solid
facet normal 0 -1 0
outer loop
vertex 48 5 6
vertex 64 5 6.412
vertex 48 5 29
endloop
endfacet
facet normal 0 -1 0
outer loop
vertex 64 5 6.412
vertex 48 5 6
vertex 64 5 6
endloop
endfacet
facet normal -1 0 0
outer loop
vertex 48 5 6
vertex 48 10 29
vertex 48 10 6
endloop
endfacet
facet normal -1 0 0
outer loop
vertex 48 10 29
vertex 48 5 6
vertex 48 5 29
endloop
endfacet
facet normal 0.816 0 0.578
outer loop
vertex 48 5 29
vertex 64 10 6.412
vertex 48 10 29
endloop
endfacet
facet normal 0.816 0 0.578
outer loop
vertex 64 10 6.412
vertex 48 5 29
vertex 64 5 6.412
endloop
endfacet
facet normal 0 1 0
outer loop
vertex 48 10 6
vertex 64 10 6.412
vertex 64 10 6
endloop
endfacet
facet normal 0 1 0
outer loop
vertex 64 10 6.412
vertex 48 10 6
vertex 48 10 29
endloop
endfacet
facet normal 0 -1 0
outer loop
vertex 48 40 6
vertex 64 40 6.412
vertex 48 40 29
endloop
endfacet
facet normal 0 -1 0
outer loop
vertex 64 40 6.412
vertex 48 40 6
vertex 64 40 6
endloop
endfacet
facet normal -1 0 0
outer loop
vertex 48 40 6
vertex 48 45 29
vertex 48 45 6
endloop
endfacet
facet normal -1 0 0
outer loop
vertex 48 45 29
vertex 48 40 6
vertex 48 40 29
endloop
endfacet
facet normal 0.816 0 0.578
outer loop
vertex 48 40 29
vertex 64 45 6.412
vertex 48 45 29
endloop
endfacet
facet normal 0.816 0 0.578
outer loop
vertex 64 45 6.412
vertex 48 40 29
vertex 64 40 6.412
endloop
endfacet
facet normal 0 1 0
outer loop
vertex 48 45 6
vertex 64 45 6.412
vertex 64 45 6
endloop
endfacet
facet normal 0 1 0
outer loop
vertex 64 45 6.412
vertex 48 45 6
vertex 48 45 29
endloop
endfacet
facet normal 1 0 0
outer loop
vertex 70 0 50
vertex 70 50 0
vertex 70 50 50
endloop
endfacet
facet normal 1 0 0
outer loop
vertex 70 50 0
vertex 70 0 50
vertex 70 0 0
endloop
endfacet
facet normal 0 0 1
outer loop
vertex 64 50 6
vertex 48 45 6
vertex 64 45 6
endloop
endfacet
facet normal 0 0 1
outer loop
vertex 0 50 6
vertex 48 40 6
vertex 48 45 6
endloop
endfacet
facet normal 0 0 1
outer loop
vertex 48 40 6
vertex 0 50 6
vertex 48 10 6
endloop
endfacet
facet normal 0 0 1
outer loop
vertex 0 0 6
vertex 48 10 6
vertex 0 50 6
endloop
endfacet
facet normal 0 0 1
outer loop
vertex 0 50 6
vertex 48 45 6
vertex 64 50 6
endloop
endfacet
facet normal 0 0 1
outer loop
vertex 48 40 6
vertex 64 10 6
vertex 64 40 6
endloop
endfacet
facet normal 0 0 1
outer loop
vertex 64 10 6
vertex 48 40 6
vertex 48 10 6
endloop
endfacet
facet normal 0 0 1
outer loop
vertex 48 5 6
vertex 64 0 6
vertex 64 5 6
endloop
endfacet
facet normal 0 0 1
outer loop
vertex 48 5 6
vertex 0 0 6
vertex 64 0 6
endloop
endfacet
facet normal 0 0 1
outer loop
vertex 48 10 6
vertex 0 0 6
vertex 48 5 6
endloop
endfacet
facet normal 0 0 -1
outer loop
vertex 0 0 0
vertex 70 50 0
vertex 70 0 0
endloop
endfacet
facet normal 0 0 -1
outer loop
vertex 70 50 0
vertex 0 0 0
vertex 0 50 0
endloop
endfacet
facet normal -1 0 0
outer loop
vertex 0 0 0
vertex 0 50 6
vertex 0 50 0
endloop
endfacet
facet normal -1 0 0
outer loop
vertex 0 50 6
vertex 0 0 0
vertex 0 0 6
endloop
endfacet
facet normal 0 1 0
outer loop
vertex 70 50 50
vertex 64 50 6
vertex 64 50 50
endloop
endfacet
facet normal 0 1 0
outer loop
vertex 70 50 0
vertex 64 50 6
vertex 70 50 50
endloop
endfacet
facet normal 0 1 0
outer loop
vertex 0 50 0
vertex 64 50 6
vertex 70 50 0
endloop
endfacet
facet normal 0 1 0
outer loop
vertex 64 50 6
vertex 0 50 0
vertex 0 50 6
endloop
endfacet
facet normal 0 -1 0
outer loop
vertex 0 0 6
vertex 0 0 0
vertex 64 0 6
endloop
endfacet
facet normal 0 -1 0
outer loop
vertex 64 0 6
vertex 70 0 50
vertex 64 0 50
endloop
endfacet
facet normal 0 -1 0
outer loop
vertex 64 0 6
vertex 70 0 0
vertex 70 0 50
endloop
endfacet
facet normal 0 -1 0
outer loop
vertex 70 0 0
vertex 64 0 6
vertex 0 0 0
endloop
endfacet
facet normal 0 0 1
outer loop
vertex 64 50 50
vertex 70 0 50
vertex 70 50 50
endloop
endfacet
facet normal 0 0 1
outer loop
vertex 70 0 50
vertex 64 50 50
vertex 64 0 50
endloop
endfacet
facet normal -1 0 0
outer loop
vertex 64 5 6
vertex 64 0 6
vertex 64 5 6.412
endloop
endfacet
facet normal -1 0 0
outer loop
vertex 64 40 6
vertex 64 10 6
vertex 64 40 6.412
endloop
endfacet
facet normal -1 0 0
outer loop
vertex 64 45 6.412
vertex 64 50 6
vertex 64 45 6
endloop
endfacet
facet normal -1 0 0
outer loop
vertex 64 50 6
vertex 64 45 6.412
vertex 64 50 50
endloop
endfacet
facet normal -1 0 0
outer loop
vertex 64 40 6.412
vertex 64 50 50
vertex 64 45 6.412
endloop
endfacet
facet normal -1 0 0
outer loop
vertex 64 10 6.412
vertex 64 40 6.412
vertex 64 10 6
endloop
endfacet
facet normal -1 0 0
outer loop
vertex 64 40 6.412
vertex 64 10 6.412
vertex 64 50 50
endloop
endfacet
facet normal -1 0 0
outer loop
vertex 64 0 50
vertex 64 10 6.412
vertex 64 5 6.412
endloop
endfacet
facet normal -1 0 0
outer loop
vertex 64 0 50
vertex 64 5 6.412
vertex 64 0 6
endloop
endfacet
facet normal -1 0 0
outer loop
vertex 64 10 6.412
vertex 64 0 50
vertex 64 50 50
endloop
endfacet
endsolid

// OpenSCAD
$fn = 32;

// ----------------------------------------------------------------------
// Rib bracket: 2-gusset L bracket
// ----------------------------------------------------------------------

// --- parameters (mm) ---
base_l = 70;              // foot length, X
base_w = 50;              // foot width, Y
base_t = 6;               // foot thickness
plate_t = 6;              // upright plate thickness
plate_h = 50;             // overall height
gus_l = 16;               // gusset leg along the foot
gus_h = 24;               // gusset height
gus_t = 5;                // gusset thickness
gus_edge = 5;             // gusset margin from the foot edge
n_gus = 2;                // gusset count

gus_pitch = (base_w - 2 * gus_edge - gus_t) / (n_gus - 1);  // gusset pitch

union() {
  cube([base_l, base_w, base_t]);
  translate([base_l - plate_t, 0, base_t - 1])
    cube([plate_t, base_w, plate_h - base_t + 1]);
  for (i = [0 : n_gus - 1])
    translate([base_l - plate_t - gus_l, gus_edge + i * gus_pitch, base_t - 1])
      rotate([-90, 0, 0])
        linear_extrude(height = gus_t)
          polygon(points = [[0, 0], [gus_l + 1, 0], [0, -gus_h]]);
}
